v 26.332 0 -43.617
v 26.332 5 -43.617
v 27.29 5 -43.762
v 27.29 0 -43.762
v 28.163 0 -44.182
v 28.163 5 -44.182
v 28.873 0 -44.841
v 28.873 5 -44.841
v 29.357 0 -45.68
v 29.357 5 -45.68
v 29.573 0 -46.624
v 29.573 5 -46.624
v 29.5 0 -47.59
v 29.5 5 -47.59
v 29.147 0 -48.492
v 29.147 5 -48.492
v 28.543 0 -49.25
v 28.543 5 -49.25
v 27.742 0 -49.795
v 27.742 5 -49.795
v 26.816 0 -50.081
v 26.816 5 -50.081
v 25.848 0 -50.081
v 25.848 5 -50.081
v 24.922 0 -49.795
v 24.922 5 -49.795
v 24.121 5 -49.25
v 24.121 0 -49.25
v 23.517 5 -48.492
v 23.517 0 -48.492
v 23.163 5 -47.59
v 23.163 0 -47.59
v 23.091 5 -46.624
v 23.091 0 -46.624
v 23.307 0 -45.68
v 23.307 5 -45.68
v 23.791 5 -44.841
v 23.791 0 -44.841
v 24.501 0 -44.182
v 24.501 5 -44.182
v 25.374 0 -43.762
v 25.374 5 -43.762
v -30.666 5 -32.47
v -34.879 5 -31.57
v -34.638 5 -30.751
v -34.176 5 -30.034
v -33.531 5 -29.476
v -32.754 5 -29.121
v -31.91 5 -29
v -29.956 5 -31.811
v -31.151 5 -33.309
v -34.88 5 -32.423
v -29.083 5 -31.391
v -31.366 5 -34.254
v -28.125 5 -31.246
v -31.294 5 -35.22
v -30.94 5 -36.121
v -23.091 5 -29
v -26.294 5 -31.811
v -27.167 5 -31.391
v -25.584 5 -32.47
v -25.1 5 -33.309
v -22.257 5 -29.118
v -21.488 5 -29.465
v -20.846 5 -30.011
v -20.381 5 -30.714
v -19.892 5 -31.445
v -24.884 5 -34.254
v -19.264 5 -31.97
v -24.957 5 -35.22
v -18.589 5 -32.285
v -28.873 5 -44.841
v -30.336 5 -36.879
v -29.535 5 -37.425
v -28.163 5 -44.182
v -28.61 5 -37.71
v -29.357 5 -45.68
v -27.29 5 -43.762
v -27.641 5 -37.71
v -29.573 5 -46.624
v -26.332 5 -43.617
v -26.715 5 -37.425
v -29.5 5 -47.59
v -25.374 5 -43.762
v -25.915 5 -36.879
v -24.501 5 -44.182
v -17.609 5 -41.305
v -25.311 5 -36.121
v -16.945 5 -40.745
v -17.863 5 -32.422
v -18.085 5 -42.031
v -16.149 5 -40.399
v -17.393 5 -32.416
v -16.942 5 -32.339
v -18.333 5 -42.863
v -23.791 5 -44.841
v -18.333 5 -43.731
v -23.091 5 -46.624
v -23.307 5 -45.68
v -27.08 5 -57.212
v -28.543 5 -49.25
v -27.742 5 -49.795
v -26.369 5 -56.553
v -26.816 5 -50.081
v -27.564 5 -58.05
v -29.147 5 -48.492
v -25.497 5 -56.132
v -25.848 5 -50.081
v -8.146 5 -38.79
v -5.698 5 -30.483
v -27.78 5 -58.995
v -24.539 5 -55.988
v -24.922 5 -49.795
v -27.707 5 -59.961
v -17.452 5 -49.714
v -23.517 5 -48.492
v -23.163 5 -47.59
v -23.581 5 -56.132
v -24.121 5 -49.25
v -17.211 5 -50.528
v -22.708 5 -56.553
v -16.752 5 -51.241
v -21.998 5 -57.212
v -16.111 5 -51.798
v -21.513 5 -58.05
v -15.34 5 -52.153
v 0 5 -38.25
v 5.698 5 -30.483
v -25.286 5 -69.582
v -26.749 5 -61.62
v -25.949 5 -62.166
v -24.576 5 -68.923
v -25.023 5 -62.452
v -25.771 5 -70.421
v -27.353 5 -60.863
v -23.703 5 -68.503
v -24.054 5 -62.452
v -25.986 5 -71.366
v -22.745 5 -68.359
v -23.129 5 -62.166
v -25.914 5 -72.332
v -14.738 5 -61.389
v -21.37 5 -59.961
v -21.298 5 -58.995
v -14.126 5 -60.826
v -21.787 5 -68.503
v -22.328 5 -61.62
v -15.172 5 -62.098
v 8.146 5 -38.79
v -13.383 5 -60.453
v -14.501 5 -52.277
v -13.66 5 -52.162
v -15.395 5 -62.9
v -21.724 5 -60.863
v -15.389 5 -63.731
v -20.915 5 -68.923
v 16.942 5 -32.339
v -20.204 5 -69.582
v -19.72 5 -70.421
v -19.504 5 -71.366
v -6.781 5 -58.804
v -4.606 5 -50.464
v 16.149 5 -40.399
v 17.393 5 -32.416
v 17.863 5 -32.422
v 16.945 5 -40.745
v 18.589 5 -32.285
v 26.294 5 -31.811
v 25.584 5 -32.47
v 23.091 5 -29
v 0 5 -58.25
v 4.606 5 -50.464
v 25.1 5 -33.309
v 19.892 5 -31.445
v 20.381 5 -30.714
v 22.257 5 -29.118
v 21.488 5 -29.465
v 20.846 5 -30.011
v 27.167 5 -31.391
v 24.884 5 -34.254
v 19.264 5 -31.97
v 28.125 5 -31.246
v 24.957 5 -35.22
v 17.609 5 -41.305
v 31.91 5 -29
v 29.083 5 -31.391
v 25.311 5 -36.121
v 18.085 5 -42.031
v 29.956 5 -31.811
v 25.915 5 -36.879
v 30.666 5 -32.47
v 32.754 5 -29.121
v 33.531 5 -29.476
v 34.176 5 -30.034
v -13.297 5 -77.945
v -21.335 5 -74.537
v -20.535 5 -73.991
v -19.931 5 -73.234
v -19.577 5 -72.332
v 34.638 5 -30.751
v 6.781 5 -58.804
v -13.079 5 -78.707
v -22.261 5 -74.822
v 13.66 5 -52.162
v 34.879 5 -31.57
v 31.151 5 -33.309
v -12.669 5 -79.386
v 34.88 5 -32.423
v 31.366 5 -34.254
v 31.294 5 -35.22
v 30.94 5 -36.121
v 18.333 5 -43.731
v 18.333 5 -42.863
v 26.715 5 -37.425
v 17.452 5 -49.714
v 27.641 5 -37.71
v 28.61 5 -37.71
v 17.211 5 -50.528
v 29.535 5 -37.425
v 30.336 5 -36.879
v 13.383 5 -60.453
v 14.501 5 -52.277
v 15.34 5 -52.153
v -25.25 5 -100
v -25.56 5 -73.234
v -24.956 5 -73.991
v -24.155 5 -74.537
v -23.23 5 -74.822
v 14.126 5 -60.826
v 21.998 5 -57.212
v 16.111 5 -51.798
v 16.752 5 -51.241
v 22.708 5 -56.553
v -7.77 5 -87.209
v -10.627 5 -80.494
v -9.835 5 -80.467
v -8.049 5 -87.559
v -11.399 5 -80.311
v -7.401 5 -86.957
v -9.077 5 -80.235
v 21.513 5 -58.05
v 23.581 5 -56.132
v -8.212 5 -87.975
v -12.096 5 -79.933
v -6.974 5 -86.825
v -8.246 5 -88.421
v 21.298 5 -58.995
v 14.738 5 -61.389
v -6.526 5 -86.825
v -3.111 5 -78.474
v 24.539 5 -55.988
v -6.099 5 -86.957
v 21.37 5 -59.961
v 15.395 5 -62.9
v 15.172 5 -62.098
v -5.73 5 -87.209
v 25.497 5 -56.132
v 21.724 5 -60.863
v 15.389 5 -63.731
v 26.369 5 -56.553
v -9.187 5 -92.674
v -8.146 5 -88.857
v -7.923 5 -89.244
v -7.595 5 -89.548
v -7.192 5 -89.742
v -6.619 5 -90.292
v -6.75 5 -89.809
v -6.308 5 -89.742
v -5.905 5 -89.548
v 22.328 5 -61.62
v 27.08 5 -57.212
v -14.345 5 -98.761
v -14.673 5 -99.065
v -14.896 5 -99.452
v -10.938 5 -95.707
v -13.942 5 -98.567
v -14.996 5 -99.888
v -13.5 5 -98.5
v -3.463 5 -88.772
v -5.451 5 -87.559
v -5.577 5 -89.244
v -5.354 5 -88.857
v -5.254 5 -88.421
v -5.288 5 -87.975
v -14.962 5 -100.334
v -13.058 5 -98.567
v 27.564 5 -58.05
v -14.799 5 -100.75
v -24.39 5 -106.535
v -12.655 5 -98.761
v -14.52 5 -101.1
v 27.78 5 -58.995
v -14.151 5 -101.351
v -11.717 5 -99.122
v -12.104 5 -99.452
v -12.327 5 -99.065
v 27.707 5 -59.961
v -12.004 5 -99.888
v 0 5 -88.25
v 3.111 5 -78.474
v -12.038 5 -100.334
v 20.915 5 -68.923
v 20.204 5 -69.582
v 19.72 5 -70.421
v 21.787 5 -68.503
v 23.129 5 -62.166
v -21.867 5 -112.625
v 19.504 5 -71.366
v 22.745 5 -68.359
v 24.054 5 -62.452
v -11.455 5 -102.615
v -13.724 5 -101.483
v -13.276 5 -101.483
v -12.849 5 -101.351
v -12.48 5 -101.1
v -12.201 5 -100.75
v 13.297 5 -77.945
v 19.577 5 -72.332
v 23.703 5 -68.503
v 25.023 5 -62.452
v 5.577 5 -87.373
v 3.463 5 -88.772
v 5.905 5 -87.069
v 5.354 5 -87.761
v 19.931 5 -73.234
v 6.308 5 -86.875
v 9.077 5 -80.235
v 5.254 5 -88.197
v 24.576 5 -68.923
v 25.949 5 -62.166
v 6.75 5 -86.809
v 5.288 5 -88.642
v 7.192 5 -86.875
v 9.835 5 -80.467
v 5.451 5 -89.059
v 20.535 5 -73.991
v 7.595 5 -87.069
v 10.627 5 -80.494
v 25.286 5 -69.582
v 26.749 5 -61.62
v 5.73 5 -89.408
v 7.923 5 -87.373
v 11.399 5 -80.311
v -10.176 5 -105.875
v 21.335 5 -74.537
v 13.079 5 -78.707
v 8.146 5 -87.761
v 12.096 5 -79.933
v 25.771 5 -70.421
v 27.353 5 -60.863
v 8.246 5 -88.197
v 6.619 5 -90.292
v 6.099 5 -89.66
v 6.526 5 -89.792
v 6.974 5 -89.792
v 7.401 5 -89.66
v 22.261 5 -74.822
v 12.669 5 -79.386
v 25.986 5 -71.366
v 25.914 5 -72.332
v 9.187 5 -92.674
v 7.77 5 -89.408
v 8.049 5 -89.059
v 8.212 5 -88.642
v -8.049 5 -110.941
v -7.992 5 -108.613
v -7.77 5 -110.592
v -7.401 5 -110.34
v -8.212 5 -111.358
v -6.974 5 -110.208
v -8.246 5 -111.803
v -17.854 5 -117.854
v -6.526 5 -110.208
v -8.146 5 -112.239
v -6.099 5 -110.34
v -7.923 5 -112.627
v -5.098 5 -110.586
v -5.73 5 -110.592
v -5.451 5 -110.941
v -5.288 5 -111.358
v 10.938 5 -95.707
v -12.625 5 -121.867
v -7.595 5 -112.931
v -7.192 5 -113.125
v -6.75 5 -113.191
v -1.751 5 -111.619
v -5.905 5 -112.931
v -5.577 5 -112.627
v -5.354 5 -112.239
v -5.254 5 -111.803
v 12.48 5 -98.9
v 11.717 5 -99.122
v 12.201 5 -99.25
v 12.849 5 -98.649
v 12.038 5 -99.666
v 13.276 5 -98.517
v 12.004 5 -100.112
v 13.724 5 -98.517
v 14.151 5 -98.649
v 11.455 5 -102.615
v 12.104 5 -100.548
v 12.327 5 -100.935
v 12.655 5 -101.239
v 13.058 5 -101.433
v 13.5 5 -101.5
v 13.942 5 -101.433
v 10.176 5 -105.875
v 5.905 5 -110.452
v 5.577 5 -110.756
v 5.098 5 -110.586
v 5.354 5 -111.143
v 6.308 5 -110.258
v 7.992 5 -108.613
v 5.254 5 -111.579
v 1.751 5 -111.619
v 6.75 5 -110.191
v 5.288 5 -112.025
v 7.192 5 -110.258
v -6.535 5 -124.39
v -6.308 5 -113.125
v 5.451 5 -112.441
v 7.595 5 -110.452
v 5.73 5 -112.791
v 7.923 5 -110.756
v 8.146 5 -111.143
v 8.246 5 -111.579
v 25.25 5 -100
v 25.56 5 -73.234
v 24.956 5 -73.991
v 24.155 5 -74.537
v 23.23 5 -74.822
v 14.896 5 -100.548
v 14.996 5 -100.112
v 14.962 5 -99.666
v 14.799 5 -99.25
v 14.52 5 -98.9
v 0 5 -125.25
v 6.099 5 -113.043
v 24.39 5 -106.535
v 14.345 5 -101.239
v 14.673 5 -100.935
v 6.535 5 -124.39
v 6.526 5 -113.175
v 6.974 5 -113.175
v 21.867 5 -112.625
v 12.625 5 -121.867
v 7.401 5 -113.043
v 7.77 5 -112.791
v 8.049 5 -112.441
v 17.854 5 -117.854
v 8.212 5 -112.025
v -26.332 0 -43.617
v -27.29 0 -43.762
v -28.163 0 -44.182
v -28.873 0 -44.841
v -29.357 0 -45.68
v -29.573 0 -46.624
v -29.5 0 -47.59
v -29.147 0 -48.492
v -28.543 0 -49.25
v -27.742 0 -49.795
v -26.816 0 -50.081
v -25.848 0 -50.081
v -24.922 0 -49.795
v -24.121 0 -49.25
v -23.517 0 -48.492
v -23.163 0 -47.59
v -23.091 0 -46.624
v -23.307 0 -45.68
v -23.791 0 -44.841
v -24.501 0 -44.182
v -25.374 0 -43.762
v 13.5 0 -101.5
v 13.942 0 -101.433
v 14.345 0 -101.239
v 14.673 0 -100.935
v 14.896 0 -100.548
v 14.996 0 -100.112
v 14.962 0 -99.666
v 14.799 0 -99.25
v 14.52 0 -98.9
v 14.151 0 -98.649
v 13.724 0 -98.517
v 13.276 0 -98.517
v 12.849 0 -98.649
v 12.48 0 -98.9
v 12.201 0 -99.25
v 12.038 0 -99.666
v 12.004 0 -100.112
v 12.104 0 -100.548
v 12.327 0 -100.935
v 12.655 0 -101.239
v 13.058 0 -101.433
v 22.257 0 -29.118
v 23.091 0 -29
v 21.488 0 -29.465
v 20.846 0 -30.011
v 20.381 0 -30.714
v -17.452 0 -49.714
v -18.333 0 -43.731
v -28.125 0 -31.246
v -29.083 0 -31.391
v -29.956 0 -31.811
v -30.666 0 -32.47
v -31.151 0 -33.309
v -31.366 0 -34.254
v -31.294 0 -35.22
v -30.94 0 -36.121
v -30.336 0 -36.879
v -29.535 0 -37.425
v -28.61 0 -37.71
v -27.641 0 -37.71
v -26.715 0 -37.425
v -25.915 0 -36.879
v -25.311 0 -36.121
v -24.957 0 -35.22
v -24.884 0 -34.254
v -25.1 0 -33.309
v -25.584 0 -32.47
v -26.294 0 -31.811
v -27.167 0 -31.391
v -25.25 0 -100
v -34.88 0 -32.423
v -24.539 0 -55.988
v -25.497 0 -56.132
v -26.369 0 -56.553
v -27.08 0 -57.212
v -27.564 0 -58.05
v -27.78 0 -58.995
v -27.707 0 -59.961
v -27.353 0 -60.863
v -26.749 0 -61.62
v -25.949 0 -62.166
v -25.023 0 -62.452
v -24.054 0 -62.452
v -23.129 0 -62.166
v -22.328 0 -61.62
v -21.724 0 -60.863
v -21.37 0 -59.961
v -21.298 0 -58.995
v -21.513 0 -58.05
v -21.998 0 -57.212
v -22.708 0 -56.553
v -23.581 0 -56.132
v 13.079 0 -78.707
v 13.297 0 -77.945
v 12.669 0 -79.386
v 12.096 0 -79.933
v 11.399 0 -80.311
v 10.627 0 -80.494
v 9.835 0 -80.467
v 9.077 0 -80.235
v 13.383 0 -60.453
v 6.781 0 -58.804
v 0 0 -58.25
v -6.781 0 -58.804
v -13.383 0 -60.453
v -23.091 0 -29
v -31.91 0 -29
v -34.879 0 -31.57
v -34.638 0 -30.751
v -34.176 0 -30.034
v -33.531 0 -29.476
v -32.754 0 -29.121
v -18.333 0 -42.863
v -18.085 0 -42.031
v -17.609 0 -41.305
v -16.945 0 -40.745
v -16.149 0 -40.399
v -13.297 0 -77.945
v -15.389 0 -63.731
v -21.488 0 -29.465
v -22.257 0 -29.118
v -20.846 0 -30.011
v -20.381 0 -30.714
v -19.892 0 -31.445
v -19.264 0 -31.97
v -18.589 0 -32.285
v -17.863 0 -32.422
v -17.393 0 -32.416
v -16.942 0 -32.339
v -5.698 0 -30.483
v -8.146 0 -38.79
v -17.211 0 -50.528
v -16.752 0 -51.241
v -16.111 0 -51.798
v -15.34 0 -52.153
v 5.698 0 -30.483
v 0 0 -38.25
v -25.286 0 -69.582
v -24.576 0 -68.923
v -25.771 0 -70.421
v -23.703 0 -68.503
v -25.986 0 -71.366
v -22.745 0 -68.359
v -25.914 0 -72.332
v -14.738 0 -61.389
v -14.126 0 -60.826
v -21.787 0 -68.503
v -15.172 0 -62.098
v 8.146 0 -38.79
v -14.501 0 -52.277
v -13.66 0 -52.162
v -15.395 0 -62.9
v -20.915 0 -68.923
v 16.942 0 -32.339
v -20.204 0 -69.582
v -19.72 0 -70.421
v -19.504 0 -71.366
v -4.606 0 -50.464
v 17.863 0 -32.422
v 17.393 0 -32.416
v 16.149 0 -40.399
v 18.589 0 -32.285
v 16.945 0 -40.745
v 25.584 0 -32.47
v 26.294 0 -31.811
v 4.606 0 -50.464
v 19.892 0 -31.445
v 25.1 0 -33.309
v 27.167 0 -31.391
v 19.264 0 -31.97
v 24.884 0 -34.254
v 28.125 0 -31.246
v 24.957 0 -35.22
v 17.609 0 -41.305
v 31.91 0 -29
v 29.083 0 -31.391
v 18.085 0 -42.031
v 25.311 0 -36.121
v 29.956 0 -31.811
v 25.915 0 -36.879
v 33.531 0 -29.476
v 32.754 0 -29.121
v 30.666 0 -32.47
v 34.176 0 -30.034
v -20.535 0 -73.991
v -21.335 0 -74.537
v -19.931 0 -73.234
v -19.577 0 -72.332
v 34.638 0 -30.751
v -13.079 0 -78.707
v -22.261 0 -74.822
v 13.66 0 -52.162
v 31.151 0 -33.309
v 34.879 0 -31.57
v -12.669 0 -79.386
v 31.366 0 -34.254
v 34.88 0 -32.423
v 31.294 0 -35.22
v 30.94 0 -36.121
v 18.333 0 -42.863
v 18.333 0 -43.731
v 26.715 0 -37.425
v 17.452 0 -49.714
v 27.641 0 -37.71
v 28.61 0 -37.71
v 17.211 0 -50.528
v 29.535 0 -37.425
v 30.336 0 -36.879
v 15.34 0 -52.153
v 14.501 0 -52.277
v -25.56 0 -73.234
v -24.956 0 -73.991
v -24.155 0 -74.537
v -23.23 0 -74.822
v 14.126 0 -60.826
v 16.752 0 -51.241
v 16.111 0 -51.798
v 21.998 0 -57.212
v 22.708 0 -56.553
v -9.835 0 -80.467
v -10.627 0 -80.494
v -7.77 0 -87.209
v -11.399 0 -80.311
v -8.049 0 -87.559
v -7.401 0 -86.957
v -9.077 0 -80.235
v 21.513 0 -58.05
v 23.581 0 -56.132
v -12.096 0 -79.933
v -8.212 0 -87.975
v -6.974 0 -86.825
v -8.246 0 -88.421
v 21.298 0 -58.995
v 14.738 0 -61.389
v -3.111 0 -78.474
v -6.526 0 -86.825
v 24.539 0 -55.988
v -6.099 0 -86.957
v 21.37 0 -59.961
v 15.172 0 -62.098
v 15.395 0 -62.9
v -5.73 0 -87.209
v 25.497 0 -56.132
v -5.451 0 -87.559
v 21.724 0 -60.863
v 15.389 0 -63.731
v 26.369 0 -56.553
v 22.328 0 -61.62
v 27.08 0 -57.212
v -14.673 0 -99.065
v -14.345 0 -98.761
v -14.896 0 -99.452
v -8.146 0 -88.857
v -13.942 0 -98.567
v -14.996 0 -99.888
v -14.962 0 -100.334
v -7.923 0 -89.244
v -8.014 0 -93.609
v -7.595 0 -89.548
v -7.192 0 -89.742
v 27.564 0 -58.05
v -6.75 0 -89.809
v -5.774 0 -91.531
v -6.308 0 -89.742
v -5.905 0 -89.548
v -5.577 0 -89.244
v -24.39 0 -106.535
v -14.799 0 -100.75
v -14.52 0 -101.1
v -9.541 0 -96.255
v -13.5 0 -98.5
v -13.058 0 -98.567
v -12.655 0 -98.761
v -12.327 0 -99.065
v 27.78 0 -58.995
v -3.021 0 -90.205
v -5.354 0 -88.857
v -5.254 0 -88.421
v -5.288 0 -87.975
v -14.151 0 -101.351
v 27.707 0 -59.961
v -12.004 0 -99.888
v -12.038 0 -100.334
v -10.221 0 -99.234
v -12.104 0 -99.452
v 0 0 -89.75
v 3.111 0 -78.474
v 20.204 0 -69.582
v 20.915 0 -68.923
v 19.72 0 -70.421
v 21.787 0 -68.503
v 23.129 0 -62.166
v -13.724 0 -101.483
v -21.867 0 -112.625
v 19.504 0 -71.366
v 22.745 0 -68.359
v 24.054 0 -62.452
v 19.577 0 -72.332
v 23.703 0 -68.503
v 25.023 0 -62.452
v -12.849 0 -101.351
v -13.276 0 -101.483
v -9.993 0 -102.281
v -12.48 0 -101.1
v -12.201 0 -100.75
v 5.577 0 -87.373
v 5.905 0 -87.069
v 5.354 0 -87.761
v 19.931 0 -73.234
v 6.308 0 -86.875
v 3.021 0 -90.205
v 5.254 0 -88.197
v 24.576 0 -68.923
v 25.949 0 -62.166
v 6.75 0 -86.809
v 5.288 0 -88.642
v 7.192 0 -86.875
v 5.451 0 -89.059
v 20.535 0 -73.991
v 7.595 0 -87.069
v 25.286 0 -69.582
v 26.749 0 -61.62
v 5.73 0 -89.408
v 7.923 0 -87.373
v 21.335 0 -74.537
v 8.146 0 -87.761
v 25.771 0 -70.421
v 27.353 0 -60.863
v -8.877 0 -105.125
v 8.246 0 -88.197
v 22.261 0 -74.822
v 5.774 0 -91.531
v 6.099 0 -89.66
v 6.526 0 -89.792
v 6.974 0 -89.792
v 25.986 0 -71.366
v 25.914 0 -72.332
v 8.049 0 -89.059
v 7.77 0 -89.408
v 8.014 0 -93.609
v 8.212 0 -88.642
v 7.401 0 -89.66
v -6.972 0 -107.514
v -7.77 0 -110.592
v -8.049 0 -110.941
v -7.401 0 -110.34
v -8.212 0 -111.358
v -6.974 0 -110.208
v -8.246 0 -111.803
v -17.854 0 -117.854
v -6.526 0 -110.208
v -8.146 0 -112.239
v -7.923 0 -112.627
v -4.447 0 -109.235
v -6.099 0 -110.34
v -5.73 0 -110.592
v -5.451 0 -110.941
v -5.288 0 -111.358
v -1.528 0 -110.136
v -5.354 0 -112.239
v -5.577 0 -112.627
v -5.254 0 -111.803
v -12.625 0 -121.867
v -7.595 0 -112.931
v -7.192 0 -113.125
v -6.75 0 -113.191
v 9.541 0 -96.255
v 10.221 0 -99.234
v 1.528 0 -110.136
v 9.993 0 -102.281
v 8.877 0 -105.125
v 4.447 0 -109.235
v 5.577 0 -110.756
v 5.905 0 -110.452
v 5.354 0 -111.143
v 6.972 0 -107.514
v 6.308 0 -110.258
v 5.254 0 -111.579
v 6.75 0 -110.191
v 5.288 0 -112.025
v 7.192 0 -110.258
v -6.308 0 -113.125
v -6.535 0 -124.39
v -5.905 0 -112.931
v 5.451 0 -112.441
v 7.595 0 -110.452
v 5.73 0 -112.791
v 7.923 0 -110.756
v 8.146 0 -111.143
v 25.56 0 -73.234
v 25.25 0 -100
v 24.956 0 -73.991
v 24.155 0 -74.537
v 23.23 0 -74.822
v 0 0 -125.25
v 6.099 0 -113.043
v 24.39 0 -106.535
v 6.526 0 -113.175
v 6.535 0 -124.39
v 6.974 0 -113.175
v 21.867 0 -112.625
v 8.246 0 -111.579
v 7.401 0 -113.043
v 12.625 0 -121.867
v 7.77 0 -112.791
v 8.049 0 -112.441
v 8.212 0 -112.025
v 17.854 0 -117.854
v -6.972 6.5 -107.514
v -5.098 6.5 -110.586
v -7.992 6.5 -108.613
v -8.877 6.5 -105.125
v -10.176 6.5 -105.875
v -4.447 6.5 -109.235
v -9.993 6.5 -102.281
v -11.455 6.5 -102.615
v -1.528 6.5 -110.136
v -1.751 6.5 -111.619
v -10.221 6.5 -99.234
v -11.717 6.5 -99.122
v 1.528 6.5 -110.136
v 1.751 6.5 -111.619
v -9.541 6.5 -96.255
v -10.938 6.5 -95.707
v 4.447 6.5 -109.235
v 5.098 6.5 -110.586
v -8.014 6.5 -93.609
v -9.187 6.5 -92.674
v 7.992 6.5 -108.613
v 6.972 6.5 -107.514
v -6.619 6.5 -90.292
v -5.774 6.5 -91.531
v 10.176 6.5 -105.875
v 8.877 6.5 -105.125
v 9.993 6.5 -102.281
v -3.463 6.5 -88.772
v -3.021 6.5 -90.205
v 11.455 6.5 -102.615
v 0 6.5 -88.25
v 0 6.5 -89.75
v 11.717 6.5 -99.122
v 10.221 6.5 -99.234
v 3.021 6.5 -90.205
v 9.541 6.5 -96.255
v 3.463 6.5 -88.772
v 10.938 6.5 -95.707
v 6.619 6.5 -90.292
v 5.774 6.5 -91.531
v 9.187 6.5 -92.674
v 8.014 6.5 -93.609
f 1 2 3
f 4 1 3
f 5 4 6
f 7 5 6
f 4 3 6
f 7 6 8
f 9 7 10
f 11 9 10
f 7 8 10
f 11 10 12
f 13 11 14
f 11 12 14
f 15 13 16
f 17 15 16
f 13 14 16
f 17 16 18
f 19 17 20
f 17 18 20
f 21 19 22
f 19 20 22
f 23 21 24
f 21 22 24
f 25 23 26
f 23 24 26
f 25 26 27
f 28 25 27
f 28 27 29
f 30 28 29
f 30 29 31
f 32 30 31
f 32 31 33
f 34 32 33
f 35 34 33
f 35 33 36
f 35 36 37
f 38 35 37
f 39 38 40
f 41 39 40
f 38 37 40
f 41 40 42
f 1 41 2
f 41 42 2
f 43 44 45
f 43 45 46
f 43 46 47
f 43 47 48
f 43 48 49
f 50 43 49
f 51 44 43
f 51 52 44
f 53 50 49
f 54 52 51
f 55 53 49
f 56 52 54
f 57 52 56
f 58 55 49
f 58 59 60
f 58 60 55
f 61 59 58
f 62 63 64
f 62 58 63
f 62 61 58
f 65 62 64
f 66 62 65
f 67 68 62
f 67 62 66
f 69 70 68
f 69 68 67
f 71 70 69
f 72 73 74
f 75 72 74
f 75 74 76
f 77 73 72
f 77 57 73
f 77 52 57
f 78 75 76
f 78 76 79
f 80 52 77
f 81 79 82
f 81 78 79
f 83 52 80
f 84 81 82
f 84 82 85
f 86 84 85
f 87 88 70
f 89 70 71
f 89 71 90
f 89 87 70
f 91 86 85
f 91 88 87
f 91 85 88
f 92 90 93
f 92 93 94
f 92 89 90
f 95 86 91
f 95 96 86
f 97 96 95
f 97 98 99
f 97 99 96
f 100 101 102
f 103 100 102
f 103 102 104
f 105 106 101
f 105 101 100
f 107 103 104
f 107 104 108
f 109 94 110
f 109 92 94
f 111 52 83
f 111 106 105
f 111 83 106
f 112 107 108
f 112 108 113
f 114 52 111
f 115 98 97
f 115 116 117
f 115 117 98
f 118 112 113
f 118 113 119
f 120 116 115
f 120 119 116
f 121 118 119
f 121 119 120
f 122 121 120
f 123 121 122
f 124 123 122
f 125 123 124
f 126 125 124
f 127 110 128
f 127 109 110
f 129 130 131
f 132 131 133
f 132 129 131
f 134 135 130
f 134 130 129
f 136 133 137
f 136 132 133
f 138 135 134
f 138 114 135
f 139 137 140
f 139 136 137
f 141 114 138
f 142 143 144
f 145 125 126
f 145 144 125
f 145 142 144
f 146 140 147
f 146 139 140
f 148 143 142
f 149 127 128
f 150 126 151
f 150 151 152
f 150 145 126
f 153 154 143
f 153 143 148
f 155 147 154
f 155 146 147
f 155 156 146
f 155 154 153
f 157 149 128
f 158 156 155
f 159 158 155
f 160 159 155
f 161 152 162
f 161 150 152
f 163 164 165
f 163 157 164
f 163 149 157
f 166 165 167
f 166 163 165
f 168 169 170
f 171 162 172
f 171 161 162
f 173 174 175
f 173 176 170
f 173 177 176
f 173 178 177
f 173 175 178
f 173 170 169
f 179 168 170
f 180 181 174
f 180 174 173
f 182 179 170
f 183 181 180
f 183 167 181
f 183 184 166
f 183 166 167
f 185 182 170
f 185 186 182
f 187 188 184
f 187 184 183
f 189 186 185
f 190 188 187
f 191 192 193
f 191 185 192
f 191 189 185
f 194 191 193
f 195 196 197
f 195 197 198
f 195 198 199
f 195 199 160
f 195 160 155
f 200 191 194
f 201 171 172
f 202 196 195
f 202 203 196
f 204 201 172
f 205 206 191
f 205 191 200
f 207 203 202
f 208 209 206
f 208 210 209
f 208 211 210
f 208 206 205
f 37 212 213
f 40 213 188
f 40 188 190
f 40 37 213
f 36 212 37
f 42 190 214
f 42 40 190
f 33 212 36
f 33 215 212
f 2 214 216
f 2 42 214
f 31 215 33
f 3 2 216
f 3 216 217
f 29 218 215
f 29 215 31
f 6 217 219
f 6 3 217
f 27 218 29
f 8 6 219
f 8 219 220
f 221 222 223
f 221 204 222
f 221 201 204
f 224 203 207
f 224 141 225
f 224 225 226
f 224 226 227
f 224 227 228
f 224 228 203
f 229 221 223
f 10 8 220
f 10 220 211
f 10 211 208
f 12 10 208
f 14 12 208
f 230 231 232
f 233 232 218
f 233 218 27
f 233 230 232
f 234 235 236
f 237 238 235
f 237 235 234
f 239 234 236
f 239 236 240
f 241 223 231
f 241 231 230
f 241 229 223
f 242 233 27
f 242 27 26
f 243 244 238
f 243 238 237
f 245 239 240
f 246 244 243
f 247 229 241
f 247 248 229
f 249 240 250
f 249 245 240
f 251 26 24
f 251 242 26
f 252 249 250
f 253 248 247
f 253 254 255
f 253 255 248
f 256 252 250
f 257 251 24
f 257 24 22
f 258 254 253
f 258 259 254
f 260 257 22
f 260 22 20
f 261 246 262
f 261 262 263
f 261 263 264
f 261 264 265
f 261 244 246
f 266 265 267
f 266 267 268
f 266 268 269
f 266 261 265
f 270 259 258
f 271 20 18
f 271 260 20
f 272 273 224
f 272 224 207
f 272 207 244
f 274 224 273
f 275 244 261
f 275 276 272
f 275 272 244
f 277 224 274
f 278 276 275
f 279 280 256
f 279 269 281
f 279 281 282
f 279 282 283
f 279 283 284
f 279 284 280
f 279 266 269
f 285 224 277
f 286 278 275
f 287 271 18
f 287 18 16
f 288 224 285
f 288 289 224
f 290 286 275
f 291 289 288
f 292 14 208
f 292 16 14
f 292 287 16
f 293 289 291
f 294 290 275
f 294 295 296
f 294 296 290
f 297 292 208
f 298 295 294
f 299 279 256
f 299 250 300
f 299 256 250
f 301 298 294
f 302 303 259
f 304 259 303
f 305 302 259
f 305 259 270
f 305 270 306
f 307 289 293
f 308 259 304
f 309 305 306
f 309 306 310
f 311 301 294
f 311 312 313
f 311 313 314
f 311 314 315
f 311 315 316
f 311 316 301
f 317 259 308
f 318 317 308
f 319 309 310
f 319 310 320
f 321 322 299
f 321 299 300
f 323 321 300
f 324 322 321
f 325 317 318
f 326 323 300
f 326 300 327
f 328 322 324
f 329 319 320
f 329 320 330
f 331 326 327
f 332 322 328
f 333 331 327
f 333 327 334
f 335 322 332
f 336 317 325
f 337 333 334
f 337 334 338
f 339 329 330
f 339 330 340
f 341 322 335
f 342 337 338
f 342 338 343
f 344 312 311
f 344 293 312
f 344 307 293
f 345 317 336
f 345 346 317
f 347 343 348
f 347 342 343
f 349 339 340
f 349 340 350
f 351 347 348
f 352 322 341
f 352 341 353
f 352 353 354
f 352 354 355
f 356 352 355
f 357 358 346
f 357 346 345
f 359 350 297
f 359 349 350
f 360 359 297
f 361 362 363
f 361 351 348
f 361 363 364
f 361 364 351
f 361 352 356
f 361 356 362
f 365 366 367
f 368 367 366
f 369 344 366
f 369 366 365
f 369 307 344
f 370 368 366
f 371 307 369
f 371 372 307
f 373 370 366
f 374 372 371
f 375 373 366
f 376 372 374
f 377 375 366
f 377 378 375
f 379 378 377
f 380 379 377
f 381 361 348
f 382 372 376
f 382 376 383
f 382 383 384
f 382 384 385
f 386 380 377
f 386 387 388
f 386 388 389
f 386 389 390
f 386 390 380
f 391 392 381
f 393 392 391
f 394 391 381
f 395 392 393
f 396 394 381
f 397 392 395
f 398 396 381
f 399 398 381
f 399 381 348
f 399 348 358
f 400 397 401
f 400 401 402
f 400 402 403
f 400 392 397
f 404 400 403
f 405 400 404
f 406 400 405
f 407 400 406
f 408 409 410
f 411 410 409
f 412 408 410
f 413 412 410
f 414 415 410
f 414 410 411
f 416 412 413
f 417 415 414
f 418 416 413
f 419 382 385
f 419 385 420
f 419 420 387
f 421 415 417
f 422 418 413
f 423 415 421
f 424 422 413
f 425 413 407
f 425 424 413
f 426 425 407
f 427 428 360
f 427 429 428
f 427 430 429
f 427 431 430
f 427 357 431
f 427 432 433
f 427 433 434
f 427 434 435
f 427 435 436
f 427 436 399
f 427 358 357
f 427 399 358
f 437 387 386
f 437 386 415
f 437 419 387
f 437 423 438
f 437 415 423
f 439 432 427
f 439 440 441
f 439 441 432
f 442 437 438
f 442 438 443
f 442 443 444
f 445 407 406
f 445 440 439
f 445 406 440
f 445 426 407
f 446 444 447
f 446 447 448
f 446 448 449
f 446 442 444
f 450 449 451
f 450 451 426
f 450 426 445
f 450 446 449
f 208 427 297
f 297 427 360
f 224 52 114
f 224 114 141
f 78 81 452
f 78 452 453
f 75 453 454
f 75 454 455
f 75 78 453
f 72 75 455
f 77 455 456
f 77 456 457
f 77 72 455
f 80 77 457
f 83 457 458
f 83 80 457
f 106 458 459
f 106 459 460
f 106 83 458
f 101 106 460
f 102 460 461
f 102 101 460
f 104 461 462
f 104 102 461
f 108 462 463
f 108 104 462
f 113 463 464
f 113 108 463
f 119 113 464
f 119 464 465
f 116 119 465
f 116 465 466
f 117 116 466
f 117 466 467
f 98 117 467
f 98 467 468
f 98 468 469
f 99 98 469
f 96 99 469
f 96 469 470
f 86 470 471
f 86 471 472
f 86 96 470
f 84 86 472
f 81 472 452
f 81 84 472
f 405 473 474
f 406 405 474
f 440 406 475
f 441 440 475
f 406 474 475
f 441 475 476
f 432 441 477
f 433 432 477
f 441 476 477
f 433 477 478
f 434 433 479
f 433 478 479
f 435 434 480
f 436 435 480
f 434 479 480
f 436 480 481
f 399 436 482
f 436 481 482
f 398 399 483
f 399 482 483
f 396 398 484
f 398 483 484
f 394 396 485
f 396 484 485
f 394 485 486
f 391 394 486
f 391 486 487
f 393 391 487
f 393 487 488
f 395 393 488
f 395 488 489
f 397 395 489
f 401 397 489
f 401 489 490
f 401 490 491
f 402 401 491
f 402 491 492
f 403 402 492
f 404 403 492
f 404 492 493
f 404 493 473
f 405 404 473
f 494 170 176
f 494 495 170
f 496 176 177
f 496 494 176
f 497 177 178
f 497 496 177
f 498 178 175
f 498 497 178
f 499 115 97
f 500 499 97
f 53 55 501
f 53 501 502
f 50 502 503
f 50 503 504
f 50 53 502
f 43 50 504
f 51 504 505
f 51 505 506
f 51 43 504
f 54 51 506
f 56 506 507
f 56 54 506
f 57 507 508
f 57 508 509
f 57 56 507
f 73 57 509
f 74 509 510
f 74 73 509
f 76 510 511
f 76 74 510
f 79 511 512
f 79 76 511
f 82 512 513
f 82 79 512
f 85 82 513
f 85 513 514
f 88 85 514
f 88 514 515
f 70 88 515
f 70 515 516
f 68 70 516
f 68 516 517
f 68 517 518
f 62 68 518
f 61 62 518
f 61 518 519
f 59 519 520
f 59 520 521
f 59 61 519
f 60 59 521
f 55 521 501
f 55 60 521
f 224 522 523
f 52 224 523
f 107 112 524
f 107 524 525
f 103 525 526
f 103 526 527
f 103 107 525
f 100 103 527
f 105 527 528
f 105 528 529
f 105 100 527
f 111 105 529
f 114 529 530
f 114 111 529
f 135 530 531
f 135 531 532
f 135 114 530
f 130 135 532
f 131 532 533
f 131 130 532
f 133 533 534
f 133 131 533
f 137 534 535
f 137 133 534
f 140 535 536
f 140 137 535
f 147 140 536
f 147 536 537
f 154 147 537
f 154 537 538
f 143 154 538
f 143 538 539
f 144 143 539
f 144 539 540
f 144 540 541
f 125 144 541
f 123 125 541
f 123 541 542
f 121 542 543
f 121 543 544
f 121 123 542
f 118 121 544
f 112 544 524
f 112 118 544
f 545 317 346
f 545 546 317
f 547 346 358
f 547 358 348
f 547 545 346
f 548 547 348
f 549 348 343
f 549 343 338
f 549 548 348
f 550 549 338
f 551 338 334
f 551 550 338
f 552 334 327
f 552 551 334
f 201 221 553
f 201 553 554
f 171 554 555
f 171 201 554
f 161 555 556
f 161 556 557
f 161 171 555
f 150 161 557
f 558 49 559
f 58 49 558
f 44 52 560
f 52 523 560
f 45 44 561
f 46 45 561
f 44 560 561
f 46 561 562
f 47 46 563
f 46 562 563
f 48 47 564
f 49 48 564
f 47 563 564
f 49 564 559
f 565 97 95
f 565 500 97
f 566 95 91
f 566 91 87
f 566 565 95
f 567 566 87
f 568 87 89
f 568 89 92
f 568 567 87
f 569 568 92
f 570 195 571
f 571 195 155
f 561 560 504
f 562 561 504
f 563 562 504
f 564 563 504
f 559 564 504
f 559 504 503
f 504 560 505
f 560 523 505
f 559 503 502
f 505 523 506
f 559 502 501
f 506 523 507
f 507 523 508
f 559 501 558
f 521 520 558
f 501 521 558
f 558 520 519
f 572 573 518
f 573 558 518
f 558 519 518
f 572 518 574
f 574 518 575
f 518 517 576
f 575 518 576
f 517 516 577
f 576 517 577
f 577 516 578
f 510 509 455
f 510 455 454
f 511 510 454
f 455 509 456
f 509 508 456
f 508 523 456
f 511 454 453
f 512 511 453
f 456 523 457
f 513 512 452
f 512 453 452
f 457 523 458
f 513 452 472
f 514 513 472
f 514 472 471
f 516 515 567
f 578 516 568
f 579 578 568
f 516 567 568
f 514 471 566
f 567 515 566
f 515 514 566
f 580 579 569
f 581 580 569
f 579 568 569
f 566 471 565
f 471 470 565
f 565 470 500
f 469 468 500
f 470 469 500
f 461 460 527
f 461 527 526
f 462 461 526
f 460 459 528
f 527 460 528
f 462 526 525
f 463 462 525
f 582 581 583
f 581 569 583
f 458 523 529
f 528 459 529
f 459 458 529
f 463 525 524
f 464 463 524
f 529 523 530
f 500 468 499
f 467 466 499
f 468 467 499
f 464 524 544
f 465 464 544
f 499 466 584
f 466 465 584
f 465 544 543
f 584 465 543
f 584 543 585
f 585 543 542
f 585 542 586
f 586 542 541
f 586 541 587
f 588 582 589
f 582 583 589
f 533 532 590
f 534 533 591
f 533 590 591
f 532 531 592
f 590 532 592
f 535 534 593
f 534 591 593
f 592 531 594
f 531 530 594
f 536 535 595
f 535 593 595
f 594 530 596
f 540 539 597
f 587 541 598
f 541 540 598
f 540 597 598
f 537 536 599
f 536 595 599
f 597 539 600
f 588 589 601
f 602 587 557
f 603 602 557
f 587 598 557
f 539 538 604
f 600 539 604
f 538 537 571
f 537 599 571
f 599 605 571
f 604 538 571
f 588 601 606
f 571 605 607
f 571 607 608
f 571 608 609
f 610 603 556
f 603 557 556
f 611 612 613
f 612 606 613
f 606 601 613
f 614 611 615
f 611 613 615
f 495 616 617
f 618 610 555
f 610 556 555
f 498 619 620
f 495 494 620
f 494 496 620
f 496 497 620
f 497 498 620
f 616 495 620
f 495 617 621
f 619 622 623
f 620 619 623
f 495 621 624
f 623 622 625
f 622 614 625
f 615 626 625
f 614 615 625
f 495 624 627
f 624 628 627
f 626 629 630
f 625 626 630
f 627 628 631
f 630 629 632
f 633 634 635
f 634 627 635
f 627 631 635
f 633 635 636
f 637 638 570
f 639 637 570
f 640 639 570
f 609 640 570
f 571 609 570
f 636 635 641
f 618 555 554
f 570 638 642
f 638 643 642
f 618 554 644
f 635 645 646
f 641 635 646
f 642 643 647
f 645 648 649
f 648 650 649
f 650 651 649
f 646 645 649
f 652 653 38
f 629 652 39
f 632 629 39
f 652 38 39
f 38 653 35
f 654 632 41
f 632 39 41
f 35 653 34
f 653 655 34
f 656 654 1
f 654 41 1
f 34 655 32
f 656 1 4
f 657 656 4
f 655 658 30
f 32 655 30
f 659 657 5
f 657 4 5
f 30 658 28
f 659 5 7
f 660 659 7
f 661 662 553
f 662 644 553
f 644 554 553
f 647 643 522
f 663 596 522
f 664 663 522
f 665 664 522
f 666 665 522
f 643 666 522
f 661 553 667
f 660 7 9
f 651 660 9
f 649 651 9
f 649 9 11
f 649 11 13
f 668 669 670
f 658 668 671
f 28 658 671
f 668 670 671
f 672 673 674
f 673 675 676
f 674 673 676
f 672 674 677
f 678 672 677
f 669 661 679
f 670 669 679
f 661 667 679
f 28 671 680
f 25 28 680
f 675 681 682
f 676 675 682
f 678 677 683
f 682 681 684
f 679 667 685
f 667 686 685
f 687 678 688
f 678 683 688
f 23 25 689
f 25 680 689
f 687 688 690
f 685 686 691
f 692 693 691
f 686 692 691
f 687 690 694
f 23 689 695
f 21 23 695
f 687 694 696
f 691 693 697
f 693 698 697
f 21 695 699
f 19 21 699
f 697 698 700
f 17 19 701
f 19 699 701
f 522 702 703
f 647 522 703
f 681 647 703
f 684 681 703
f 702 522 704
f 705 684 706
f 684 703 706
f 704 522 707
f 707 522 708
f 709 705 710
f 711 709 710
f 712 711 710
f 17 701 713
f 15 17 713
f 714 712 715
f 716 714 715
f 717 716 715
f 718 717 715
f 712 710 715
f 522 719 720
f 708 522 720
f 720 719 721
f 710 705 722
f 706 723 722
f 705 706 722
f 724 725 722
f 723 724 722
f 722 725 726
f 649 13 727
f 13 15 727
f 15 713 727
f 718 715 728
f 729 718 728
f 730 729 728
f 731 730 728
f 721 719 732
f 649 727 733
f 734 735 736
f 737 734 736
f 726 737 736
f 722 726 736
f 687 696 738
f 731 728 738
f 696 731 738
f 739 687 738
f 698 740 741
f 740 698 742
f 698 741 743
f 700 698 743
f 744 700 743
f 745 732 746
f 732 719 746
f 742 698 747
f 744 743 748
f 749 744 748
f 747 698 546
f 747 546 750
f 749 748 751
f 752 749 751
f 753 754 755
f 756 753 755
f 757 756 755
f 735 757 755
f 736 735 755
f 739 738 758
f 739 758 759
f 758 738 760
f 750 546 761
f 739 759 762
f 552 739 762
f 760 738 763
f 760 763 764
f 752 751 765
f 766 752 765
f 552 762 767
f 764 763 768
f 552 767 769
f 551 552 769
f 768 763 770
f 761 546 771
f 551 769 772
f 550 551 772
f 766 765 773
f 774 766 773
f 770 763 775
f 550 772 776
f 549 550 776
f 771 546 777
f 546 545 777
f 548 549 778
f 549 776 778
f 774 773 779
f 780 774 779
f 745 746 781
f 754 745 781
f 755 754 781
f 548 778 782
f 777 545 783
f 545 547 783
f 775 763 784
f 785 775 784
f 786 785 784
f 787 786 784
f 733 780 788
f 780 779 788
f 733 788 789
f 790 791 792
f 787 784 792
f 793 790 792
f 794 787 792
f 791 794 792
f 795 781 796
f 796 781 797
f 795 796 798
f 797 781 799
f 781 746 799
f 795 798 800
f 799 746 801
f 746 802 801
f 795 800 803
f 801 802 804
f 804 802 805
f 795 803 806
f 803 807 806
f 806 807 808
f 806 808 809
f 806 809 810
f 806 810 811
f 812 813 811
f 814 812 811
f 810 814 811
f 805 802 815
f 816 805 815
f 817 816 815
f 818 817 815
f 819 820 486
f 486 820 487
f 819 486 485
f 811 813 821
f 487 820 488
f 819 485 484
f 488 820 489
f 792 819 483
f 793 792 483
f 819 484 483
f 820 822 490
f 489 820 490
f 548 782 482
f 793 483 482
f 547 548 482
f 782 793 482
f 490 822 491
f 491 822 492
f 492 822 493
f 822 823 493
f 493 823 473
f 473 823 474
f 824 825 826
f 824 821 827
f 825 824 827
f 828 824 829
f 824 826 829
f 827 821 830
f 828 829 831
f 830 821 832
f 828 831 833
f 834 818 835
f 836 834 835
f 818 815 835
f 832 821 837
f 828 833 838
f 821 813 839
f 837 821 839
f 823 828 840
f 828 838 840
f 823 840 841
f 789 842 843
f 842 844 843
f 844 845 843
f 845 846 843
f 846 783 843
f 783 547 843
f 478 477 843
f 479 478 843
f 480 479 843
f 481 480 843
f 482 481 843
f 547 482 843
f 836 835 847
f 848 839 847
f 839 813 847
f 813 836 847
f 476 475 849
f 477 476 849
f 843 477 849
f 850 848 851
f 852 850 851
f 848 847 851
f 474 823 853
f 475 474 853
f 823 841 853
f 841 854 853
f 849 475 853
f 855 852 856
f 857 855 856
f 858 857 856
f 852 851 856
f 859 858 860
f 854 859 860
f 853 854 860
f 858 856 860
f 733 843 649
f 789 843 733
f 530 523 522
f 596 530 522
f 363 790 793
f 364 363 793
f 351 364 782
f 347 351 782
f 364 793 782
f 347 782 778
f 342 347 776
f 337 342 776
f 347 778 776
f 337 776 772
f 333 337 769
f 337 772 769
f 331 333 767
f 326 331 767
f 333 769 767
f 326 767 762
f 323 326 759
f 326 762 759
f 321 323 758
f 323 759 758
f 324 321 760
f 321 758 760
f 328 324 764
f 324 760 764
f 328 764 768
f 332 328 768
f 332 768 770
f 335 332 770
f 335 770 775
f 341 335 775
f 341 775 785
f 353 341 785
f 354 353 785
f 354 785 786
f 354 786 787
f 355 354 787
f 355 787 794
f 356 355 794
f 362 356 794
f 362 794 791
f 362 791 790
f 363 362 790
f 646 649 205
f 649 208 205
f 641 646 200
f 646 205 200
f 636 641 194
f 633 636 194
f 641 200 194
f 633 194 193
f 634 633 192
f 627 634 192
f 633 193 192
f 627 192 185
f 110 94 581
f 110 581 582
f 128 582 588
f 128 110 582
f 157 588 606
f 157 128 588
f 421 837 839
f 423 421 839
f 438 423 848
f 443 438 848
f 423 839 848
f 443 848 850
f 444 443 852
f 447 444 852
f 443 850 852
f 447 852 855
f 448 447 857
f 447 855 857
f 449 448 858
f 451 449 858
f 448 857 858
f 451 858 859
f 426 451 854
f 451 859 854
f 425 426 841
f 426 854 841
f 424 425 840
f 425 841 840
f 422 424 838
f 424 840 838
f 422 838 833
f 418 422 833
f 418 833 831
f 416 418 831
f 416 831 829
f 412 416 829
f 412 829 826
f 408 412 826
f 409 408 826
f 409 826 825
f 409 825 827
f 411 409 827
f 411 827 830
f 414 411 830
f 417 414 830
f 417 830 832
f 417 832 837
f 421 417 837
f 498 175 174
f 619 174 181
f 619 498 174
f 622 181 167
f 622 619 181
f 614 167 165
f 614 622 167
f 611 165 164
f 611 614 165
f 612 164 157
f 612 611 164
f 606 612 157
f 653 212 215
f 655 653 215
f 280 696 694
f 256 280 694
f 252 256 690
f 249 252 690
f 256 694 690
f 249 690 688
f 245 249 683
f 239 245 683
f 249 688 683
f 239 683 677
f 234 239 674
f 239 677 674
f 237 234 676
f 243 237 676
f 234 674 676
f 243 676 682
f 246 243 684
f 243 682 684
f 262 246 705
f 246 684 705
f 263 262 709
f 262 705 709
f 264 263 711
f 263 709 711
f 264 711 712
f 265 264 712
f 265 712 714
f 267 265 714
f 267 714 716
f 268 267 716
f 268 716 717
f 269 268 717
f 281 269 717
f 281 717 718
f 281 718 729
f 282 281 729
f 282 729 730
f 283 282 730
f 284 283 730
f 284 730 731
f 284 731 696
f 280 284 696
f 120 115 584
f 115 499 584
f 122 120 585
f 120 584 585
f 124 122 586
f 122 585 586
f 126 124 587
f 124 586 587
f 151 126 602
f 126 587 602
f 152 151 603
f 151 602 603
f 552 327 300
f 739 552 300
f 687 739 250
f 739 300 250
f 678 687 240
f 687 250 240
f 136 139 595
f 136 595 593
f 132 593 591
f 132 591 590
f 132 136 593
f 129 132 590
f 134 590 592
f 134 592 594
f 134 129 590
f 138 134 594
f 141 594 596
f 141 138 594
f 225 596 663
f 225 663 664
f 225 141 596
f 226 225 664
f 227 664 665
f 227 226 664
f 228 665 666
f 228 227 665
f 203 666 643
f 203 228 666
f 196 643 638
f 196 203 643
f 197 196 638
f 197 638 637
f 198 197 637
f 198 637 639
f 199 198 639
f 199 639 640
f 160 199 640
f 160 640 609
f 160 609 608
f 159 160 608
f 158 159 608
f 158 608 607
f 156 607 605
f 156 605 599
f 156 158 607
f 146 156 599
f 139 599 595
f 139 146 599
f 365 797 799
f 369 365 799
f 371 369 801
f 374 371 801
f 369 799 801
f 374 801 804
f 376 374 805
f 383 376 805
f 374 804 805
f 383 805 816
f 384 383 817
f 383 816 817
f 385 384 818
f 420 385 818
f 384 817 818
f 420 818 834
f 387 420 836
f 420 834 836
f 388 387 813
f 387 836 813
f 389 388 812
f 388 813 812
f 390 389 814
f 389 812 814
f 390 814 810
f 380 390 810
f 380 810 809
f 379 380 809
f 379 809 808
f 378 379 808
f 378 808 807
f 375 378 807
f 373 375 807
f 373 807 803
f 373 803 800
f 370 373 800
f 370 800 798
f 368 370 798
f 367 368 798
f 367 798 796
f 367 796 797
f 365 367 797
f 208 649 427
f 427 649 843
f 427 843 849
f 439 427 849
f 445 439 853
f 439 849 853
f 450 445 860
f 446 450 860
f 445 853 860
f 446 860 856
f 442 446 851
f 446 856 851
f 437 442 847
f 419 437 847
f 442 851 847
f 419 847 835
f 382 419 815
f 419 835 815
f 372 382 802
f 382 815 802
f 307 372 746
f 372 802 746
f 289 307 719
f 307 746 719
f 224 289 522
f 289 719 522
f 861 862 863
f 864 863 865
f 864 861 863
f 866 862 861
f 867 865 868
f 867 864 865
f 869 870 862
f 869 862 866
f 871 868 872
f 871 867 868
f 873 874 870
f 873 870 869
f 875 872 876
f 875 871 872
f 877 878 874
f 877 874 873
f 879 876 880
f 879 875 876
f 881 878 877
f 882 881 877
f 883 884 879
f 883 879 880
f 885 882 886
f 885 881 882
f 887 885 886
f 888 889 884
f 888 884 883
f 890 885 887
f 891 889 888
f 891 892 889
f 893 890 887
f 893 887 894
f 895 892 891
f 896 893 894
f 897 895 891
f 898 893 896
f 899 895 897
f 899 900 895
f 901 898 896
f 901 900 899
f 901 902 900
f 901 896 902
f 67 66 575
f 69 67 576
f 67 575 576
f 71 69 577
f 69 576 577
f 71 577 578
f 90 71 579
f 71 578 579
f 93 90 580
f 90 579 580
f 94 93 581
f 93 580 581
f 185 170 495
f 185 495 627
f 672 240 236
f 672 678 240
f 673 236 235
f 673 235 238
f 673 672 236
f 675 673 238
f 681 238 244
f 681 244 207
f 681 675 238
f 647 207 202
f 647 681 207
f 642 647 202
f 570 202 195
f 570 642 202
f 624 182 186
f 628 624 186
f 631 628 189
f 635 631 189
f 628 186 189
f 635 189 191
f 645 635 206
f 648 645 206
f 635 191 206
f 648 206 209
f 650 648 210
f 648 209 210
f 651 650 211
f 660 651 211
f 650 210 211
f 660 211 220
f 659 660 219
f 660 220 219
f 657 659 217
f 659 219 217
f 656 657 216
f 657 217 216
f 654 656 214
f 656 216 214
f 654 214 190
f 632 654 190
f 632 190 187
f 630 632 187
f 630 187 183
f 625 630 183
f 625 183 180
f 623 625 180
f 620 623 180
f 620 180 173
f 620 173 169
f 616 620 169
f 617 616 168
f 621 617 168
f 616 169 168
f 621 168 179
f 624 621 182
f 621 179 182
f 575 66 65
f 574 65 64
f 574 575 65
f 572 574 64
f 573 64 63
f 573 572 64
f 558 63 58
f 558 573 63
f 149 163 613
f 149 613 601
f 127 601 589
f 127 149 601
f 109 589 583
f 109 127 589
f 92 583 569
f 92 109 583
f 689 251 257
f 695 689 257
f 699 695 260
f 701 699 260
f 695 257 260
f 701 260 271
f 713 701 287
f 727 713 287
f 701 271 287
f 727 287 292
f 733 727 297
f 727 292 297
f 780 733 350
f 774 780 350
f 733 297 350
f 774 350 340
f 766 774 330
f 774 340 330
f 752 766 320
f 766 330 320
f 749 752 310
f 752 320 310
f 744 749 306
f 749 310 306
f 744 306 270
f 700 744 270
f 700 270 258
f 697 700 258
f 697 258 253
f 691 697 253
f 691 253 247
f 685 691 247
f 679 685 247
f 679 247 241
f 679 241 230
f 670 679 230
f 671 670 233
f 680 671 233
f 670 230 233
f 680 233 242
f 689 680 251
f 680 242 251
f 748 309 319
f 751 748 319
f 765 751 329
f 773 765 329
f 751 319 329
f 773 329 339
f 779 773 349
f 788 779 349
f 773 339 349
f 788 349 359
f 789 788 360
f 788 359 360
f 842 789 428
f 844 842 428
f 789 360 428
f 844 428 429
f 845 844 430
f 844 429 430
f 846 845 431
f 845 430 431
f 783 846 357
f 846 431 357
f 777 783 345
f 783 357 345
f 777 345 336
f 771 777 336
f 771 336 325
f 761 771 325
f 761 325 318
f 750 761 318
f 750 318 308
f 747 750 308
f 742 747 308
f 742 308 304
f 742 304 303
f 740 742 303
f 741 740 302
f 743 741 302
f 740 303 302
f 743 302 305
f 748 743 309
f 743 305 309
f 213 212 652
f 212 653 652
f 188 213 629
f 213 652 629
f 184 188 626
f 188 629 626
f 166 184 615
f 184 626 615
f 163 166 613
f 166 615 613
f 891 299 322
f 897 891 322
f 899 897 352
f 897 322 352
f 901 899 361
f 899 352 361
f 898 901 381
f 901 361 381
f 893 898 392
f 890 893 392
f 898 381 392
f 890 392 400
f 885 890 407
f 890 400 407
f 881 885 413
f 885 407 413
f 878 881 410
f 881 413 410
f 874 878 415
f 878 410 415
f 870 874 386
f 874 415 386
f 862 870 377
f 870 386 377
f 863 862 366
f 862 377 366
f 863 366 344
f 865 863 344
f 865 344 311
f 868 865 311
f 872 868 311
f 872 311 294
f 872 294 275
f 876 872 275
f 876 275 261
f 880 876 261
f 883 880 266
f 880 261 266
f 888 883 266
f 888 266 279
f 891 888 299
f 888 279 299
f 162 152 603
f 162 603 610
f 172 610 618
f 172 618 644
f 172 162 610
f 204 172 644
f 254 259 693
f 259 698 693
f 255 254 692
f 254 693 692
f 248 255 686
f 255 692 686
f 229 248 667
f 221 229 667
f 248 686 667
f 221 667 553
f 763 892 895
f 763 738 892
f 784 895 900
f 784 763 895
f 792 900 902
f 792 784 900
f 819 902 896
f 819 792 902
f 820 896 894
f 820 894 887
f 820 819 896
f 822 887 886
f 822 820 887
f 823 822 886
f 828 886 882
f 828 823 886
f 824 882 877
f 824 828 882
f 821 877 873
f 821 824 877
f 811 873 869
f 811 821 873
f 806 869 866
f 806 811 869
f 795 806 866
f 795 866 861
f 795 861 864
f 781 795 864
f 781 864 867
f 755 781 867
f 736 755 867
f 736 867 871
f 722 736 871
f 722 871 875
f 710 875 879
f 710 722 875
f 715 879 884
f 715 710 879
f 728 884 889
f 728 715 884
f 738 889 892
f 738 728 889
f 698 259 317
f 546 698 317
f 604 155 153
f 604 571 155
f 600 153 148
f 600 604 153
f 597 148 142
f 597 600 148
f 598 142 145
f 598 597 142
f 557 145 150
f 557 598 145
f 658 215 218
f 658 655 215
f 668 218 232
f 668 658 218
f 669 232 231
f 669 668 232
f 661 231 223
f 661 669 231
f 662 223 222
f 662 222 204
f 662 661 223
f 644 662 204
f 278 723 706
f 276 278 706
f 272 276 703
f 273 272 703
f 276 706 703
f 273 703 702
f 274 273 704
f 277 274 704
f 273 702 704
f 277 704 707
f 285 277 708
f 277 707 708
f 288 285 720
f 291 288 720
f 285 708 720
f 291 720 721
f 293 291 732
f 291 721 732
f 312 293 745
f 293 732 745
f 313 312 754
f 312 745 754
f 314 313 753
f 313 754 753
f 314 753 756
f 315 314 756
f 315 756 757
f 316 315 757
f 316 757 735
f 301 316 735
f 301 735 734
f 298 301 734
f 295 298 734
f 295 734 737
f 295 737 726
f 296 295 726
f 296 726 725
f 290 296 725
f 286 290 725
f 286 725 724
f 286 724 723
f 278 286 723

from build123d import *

# Parameters (mm, degrees)
SKETCH1_R           = 29
SKETCH1_R_2         = 2.25
SKETCH1_R_3         = 10.25
BOSS_EXTRUDE1_DEPTH = 5
SKETCH4_R           = 11.75
SKETCH4_R_2         = 10.25
BOSS_EXTRUDE2_DEPTH = 1.5
SKETCH12_R          = 3.25
CUT_EXTRUDE5_DEPTH  = 5
SKETCH13_W          = 118.6352657
SKETCH13_H          = 76.236501847
CUT_EXTRUDE6_DEPTH  = 5
CUT_EXTRUDE7_DEPTH  = 5
FILLET2_R           = 3
SKETCH15_R          = 1.5
CUT_EXTRUDE8_DEPTH  = 10
CIRPATTERN1_COUNT   = 6
BOSS_EXTRUDE3_DEPTH = 5
FILLET3_R           = 3


with BuildPart() as part:
    # Sketch1 → Boss-Extrude1 (new body)
    with BuildSketch(Plane(origin=(0, 0, 0), x_dir=(1, 0, 0), z_dir=(0, 1, 0))):
        with BuildLine():
            Line((39.5, 0), (25.25, 100))
            ThreePointArc((25.25, 100), (0, 125.25), (-25.25, 100))
            Line((-25.25, 100), (-39.5, 0))
            ThreePointArc((-39.5, 0), (0, -39.5), (39.5, 0))
        make_face()
        with Locations(Location((0, 0, 0), (0, 0, 270))):
            Circle(SKETCH1_R, mode=Mode.SUBTRACT)
        with Locations(Location((33, 0, 0), (0, 0, 270))):
            Circle(SKETCH1_R_2, mode=Mode.SUBTRACT)
        with Locations(Location((16.5, -28.578838325, 0), (0, 0, 270))):
            Circle(SKETCH1_R_2, mode=Mode.SUBTRACT)
        with Locations(Location((-16.5, -28.578838325, 0), (0, 0, 270))):
            Circle(SKETCH1_R_2, mode=Mode.SUBTRACT)
        with Locations(Location((-33, 0, 0), (0, 0, 270))):
            Circle(SKETCH1_R_2, mode=Mode.SUBTRACT)
        with Locations(Location((0, 100, 0), (0, 0, 270))):
            Circle(SKETCH1_R_3, mode=Mode.SUBTRACT)
    extrude(amount=BOSS_EXTRUDE1_DEPTH)

    # Sketch4 → Boss-Extrude2 (add)
    with BuildSketch(Plane(origin=(0, 5, 0), x_dir=(1, 0, 0), z_dir=(0, 1, 0))):
        with Locations(Location((0, 100, 0), (0, 0, 270))):
            Circle(SKETCH4_R)
        with Locations(Location((0, 100, 0), (0, 0, 270))):
            Circle(SKETCH4_R_2, mode=Mode.SUBTRACT)
    extrude(amount=BOSS_EXTRUDE2_DEPTH)

    # Sketch12 → Cut-Extrude5 (cut)
    with BuildSketch(Plane(origin=(0, 5, 0), x_dir=(1, 0, 0), z_dir=(0, 1, 0))):
        with Locations(Location((28.125255984, 34.496453628, 0), (0, 0, 270))):
            Circle(SKETCH12_R)
        with Locations(Location((26.331961895, 46.867148689, 0), (0, 0, 270))):
            Circle(SKETCH12_R)
        with Locations(Location((24.538667806, 59.237843751, 0), (0, 0, 270))):
            Circle(SKETCH12_R)
        with Locations(Location((22.745373716, 71.608538813, 0), (0, 0, 270))):
            Circle(SKETCH12_R)
    cut_extrude5 = extrude(amount=-CUT_EXTRUDE5_DEPTH, mode=Mode.SUBTRACT)

    # Mirror1: Cut-Extrude5 across plane
    add(cut_extrude5.mirror(Plane(origin=(0, 0, 0), x_dir=(0, 0, 1), z_dir=(1, 0, 0))), mode=Mode.SUBTRACT)

    # Sketch13 → Cut-Extrude6 (cut)
    with BuildSketch(Plane(origin=(0, 5, 0), x_dir=(1, 0, 0), z_dir=(0, 1, 0))):
        with Locations((0, -9.118250923)):
            Rectangle(SKETCH13_W, SKETCH13_H)
    extrude(amount=-CUT_EXTRUDE6_DEPTH, mode=Mode.SUBTRACT)

    # Sketch14 → Cut-Extrude7 (cut)
    with BuildSketch(Plane(origin=(0, 5, 0), x_dir=(1, 0, 0), z_dir=(0, 1, 0))):
        with BuildLine():
            Line((-20.500628763, 29), (20.500628763, 29))
            Line((20.500628763, 29), (12.654649355, 82.31038865))
            ThreePointArc((12.654649355, 82.31038865), (0, 78.25), (-12.654649355, 82.31038865))
            Line((-12.654649355, 82.31038865), (-20.500628763, 29))
        make_face()
    extrude(amount=-CUT_EXTRUDE7_DEPTH, mode=Mode.SUBTRACT)

    # Fillet2
    fillet2_edges = [part.edges().sort_by_distance(p)[0] for p in [
        (-20.500628763, 2.5, -29),
        (-12.654649355, 2.5, -82.31038865),
        (12.654649355, 2.5, -82.31038865),
        (20.500628763, 2.5, -29),
        (35.3675, 2.5, -29),
        (-35.3675, 2.5, -29),
    ]]
    fillet(fillet2_edges, radius=FILLET2_R)

    # Sketch15 → Cut-Extrude8 (cut)
    with BuildSketch(Plane.XZ):
        with Locations(Location((13.5, -100, 0), (0, 0, 270))):
            Circle(SKETCH15_R)
    cut_extrude8 = extrude(amount=-CUT_EXTRUDE8_DEPTH, mode=Mode.SUBTRACT)

    # CirPattern1: Cut-Extrude8 ×6 about axis
    cirpattern1_axis = Axis((0, 0, -100), (0, 1, 0))
    for i in range(1, CIRPATTERN1_COUNT):
        add(cut_extrude8.rotate(cirpattern1_axis, i * 360 / CIRPATTERN1_COUNT), mode=Mode.SUBTRACT)

    # Sketch16 → Boss-Extrude3 (add)
    with BuildSketch(Plane(origin=(0, 5, 0), x_dir=(1, 0, 0), z_dir=(0, 1, 0))):
        with BuildLine():
            ThreePointArc((-19.8904137, 33.146174808), (0, 30.25), (19.8904137, 33.146174808))
            Line((19.8904137, 33.146174808), (18.711950722, 41.153373927))
            ThreePointArc((18.711950722, 41.153373927), (0, 38.25), (-18.711950722, 41.153373927))
            Line((-18.711950722, 41.153373927), (-19.8904137, 33.146174808))
        make_face()
        with BuildLine():
            ThreePointArc((-16.935837694, 53.221373453), (0, 50.25), (16.935837694, 53.221373453))
            Line((16.935837694, 53.221373453), (15.742211816, 61.331598596))
            ThreePointArc((15.742211816, 61.331598596), (0, 58.25), (-15.742211816, 61.331598596))
            Line((-15.742211816, 61.331598596), (-16.935837694, 53.221373453))
        make_face()
    extrude(amount=-BOSS_EXTRUDE3_DEPTH)

    # Fillet3
    fillet3_edges = [part.edges().sort_by_distance(p)[0] for p in [
        (-15.742211816, 2.5, -61.331598596),
        (15.742211816, 2.5, -61.331598596),
        (16.935837694, 2.5, -53.221373453),
        (18.711950722, 2.5, -41.153373927),
        (-18.711950722, 2.5, -41.153373927),
        (19.8904137, 2.5, -33.146174808),
        (-16.935837694, 2.5, -53.221373453),
        (-19.8904137, 2.5, -33.146174808),
    ]]
    fillet(fillet3_edges, radius=FILLET3_R)


solid = part.part
